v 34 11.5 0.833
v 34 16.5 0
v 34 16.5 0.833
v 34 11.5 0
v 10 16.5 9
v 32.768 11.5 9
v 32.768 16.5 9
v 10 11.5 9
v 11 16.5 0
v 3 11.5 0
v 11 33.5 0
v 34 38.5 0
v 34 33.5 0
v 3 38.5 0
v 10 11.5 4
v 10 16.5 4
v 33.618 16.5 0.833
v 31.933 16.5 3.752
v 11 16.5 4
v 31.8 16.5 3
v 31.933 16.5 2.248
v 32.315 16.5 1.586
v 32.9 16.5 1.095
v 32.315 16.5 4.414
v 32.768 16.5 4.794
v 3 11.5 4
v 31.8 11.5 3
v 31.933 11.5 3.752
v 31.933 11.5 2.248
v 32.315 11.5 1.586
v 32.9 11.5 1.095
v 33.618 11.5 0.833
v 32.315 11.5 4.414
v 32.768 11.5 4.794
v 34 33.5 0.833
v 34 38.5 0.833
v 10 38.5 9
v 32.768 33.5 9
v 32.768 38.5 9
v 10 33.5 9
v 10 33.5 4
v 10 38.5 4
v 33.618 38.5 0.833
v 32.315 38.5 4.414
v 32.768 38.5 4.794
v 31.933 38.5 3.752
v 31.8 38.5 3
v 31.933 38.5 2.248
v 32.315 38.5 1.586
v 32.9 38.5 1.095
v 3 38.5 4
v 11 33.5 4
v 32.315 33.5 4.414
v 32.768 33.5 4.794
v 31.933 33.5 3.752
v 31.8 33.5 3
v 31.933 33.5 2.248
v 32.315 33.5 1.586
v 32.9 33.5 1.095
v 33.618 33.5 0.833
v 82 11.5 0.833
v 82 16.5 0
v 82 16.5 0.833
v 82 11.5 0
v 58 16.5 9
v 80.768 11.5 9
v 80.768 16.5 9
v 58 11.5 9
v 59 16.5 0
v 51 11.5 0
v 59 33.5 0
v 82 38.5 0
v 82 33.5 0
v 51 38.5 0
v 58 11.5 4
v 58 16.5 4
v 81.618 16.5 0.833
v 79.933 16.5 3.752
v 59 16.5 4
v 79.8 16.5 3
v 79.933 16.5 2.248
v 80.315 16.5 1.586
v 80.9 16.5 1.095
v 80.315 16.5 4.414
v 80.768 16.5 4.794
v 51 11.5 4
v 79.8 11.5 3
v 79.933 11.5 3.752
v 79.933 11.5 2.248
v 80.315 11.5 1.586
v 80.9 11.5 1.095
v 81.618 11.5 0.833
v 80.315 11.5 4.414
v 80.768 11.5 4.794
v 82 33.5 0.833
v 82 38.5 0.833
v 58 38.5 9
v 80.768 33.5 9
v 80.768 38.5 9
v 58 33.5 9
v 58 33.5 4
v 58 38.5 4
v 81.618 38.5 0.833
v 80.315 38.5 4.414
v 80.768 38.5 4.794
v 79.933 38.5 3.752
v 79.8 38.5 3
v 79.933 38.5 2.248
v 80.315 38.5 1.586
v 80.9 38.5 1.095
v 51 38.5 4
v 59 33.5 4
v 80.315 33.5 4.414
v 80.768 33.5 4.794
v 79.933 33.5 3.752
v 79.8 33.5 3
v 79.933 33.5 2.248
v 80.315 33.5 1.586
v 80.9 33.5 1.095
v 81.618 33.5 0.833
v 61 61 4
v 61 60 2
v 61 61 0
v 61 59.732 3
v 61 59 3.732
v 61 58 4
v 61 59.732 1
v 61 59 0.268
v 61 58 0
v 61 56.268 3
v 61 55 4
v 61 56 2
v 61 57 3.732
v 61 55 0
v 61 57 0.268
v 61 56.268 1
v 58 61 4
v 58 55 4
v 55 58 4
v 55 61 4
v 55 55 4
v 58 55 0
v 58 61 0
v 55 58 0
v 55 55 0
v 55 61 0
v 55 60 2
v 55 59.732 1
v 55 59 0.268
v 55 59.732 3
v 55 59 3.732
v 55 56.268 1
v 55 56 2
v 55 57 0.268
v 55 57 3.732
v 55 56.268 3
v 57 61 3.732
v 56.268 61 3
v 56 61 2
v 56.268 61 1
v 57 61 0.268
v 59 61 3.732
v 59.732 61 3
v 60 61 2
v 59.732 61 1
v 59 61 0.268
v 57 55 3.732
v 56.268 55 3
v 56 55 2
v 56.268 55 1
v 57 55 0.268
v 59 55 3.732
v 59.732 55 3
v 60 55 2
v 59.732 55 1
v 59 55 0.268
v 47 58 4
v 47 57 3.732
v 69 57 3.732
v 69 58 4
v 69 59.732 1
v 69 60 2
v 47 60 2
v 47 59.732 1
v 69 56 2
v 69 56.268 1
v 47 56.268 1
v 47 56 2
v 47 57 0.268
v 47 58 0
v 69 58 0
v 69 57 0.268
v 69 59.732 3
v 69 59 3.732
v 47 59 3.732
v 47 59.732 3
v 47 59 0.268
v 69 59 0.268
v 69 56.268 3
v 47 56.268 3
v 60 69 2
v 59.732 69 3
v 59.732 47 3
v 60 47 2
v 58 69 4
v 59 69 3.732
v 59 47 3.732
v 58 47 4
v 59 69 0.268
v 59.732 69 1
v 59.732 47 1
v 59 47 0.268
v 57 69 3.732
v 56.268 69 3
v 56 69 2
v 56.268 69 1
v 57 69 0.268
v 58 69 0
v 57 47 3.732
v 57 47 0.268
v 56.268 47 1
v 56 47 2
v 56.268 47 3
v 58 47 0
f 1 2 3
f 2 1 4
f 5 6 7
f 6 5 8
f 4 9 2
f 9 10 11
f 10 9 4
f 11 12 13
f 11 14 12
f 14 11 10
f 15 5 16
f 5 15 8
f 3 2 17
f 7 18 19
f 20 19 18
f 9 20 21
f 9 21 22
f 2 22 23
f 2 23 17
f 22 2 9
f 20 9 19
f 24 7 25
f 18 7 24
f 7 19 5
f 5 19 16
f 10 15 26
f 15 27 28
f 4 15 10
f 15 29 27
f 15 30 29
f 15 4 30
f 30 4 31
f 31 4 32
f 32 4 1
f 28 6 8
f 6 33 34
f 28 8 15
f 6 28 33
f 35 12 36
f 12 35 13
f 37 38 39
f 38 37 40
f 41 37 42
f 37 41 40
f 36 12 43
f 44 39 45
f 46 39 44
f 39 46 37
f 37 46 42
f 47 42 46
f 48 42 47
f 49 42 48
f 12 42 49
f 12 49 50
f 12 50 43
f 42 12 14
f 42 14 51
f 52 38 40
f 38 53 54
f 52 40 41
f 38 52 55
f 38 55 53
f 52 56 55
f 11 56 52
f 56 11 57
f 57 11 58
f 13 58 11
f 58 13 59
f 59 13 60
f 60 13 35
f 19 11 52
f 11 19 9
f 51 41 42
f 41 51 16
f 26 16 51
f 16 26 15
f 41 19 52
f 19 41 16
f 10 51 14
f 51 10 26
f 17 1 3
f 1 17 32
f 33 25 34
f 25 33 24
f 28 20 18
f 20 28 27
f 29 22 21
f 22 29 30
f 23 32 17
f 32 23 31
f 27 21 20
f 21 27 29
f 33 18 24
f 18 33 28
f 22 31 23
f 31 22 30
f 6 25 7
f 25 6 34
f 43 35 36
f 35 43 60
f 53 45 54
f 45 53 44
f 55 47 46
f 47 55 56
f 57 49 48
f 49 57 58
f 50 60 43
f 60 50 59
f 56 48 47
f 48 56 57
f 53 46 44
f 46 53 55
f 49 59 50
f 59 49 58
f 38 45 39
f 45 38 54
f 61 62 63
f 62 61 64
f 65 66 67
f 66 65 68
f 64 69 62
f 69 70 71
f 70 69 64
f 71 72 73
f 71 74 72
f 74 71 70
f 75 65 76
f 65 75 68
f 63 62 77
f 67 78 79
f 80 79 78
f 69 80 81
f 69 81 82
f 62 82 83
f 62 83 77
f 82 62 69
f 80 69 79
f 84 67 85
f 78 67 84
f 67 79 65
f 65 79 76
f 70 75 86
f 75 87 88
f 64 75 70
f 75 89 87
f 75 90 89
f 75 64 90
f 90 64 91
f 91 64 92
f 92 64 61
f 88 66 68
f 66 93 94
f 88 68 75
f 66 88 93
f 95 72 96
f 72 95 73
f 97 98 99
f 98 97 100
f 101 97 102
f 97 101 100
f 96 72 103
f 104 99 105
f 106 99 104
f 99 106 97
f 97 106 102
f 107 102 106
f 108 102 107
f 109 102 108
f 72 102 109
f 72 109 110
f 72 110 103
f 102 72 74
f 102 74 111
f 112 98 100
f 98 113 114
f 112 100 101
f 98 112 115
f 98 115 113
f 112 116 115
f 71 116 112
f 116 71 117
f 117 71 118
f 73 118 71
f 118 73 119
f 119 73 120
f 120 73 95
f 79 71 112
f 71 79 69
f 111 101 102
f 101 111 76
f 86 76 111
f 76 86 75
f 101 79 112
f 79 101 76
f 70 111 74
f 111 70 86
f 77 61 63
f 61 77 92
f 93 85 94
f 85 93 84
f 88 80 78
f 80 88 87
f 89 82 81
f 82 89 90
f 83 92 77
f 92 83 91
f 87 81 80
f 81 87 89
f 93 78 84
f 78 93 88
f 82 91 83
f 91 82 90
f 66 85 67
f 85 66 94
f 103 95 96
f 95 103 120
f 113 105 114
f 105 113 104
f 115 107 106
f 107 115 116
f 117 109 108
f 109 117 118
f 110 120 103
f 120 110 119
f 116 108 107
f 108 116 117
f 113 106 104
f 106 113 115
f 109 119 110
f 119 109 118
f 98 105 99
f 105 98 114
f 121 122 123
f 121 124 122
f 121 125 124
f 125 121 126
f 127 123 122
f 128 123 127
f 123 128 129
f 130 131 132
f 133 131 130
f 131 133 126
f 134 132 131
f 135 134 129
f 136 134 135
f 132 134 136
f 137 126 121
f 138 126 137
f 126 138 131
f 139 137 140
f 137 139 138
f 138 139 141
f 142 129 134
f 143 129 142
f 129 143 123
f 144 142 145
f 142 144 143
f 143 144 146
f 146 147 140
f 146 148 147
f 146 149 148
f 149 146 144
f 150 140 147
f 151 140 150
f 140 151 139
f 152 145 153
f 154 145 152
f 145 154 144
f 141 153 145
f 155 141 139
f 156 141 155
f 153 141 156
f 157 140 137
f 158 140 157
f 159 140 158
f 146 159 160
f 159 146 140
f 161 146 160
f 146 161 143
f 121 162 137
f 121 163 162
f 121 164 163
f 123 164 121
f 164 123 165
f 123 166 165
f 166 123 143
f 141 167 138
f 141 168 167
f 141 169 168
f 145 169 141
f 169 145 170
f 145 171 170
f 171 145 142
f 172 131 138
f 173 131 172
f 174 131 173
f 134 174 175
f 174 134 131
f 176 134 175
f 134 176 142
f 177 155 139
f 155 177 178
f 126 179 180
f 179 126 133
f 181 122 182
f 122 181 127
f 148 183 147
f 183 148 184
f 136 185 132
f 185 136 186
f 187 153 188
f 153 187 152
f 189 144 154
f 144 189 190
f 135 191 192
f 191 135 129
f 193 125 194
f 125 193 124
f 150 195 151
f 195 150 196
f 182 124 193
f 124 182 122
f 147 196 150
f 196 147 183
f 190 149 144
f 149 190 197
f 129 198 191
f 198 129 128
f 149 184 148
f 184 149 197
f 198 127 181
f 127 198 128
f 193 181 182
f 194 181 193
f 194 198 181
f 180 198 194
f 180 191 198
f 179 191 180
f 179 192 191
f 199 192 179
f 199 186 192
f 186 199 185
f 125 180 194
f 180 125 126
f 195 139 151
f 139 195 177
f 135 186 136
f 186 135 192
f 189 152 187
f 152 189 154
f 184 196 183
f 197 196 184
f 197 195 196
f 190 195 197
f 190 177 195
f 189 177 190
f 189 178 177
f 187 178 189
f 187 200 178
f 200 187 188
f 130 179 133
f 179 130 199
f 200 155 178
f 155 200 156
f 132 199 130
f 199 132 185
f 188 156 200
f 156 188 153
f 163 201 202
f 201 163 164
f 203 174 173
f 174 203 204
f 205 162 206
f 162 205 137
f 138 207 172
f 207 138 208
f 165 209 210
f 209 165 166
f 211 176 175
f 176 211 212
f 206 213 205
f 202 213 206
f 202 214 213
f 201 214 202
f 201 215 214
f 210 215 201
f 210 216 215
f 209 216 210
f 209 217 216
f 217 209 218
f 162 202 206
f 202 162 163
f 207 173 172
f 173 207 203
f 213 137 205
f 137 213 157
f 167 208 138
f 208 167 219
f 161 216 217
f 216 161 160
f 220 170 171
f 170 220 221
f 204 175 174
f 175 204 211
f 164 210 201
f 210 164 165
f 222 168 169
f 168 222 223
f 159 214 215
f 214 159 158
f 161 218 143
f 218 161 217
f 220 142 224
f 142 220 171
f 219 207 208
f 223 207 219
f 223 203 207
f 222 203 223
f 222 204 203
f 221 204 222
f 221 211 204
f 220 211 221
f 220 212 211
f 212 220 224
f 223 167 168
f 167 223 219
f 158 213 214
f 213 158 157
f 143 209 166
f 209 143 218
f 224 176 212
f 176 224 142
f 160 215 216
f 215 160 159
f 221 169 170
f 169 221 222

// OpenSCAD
/*
Sample 017: Schnapp-Kardangelenk — eng
Generated from the FDM Mechanical Sample Library.
Units: millimetres.

Override examples:
  openscad -o custom.stl -D 'view="plate"' -D 'render_fn=64' model.scad
  openscad -o preview.png -D 'view="assembly"' model.scad
*/
use <../../../library/fdm_mechanisms.scad>

render_fn = is_undef(render_fn) ? 48 : render_fn;
view = is_undef(view) ? "plate" : view;
$fn = render_fn;

sample_universal_joint(
    view=view,
    clearance=0.2,
    pin_d=4
);
